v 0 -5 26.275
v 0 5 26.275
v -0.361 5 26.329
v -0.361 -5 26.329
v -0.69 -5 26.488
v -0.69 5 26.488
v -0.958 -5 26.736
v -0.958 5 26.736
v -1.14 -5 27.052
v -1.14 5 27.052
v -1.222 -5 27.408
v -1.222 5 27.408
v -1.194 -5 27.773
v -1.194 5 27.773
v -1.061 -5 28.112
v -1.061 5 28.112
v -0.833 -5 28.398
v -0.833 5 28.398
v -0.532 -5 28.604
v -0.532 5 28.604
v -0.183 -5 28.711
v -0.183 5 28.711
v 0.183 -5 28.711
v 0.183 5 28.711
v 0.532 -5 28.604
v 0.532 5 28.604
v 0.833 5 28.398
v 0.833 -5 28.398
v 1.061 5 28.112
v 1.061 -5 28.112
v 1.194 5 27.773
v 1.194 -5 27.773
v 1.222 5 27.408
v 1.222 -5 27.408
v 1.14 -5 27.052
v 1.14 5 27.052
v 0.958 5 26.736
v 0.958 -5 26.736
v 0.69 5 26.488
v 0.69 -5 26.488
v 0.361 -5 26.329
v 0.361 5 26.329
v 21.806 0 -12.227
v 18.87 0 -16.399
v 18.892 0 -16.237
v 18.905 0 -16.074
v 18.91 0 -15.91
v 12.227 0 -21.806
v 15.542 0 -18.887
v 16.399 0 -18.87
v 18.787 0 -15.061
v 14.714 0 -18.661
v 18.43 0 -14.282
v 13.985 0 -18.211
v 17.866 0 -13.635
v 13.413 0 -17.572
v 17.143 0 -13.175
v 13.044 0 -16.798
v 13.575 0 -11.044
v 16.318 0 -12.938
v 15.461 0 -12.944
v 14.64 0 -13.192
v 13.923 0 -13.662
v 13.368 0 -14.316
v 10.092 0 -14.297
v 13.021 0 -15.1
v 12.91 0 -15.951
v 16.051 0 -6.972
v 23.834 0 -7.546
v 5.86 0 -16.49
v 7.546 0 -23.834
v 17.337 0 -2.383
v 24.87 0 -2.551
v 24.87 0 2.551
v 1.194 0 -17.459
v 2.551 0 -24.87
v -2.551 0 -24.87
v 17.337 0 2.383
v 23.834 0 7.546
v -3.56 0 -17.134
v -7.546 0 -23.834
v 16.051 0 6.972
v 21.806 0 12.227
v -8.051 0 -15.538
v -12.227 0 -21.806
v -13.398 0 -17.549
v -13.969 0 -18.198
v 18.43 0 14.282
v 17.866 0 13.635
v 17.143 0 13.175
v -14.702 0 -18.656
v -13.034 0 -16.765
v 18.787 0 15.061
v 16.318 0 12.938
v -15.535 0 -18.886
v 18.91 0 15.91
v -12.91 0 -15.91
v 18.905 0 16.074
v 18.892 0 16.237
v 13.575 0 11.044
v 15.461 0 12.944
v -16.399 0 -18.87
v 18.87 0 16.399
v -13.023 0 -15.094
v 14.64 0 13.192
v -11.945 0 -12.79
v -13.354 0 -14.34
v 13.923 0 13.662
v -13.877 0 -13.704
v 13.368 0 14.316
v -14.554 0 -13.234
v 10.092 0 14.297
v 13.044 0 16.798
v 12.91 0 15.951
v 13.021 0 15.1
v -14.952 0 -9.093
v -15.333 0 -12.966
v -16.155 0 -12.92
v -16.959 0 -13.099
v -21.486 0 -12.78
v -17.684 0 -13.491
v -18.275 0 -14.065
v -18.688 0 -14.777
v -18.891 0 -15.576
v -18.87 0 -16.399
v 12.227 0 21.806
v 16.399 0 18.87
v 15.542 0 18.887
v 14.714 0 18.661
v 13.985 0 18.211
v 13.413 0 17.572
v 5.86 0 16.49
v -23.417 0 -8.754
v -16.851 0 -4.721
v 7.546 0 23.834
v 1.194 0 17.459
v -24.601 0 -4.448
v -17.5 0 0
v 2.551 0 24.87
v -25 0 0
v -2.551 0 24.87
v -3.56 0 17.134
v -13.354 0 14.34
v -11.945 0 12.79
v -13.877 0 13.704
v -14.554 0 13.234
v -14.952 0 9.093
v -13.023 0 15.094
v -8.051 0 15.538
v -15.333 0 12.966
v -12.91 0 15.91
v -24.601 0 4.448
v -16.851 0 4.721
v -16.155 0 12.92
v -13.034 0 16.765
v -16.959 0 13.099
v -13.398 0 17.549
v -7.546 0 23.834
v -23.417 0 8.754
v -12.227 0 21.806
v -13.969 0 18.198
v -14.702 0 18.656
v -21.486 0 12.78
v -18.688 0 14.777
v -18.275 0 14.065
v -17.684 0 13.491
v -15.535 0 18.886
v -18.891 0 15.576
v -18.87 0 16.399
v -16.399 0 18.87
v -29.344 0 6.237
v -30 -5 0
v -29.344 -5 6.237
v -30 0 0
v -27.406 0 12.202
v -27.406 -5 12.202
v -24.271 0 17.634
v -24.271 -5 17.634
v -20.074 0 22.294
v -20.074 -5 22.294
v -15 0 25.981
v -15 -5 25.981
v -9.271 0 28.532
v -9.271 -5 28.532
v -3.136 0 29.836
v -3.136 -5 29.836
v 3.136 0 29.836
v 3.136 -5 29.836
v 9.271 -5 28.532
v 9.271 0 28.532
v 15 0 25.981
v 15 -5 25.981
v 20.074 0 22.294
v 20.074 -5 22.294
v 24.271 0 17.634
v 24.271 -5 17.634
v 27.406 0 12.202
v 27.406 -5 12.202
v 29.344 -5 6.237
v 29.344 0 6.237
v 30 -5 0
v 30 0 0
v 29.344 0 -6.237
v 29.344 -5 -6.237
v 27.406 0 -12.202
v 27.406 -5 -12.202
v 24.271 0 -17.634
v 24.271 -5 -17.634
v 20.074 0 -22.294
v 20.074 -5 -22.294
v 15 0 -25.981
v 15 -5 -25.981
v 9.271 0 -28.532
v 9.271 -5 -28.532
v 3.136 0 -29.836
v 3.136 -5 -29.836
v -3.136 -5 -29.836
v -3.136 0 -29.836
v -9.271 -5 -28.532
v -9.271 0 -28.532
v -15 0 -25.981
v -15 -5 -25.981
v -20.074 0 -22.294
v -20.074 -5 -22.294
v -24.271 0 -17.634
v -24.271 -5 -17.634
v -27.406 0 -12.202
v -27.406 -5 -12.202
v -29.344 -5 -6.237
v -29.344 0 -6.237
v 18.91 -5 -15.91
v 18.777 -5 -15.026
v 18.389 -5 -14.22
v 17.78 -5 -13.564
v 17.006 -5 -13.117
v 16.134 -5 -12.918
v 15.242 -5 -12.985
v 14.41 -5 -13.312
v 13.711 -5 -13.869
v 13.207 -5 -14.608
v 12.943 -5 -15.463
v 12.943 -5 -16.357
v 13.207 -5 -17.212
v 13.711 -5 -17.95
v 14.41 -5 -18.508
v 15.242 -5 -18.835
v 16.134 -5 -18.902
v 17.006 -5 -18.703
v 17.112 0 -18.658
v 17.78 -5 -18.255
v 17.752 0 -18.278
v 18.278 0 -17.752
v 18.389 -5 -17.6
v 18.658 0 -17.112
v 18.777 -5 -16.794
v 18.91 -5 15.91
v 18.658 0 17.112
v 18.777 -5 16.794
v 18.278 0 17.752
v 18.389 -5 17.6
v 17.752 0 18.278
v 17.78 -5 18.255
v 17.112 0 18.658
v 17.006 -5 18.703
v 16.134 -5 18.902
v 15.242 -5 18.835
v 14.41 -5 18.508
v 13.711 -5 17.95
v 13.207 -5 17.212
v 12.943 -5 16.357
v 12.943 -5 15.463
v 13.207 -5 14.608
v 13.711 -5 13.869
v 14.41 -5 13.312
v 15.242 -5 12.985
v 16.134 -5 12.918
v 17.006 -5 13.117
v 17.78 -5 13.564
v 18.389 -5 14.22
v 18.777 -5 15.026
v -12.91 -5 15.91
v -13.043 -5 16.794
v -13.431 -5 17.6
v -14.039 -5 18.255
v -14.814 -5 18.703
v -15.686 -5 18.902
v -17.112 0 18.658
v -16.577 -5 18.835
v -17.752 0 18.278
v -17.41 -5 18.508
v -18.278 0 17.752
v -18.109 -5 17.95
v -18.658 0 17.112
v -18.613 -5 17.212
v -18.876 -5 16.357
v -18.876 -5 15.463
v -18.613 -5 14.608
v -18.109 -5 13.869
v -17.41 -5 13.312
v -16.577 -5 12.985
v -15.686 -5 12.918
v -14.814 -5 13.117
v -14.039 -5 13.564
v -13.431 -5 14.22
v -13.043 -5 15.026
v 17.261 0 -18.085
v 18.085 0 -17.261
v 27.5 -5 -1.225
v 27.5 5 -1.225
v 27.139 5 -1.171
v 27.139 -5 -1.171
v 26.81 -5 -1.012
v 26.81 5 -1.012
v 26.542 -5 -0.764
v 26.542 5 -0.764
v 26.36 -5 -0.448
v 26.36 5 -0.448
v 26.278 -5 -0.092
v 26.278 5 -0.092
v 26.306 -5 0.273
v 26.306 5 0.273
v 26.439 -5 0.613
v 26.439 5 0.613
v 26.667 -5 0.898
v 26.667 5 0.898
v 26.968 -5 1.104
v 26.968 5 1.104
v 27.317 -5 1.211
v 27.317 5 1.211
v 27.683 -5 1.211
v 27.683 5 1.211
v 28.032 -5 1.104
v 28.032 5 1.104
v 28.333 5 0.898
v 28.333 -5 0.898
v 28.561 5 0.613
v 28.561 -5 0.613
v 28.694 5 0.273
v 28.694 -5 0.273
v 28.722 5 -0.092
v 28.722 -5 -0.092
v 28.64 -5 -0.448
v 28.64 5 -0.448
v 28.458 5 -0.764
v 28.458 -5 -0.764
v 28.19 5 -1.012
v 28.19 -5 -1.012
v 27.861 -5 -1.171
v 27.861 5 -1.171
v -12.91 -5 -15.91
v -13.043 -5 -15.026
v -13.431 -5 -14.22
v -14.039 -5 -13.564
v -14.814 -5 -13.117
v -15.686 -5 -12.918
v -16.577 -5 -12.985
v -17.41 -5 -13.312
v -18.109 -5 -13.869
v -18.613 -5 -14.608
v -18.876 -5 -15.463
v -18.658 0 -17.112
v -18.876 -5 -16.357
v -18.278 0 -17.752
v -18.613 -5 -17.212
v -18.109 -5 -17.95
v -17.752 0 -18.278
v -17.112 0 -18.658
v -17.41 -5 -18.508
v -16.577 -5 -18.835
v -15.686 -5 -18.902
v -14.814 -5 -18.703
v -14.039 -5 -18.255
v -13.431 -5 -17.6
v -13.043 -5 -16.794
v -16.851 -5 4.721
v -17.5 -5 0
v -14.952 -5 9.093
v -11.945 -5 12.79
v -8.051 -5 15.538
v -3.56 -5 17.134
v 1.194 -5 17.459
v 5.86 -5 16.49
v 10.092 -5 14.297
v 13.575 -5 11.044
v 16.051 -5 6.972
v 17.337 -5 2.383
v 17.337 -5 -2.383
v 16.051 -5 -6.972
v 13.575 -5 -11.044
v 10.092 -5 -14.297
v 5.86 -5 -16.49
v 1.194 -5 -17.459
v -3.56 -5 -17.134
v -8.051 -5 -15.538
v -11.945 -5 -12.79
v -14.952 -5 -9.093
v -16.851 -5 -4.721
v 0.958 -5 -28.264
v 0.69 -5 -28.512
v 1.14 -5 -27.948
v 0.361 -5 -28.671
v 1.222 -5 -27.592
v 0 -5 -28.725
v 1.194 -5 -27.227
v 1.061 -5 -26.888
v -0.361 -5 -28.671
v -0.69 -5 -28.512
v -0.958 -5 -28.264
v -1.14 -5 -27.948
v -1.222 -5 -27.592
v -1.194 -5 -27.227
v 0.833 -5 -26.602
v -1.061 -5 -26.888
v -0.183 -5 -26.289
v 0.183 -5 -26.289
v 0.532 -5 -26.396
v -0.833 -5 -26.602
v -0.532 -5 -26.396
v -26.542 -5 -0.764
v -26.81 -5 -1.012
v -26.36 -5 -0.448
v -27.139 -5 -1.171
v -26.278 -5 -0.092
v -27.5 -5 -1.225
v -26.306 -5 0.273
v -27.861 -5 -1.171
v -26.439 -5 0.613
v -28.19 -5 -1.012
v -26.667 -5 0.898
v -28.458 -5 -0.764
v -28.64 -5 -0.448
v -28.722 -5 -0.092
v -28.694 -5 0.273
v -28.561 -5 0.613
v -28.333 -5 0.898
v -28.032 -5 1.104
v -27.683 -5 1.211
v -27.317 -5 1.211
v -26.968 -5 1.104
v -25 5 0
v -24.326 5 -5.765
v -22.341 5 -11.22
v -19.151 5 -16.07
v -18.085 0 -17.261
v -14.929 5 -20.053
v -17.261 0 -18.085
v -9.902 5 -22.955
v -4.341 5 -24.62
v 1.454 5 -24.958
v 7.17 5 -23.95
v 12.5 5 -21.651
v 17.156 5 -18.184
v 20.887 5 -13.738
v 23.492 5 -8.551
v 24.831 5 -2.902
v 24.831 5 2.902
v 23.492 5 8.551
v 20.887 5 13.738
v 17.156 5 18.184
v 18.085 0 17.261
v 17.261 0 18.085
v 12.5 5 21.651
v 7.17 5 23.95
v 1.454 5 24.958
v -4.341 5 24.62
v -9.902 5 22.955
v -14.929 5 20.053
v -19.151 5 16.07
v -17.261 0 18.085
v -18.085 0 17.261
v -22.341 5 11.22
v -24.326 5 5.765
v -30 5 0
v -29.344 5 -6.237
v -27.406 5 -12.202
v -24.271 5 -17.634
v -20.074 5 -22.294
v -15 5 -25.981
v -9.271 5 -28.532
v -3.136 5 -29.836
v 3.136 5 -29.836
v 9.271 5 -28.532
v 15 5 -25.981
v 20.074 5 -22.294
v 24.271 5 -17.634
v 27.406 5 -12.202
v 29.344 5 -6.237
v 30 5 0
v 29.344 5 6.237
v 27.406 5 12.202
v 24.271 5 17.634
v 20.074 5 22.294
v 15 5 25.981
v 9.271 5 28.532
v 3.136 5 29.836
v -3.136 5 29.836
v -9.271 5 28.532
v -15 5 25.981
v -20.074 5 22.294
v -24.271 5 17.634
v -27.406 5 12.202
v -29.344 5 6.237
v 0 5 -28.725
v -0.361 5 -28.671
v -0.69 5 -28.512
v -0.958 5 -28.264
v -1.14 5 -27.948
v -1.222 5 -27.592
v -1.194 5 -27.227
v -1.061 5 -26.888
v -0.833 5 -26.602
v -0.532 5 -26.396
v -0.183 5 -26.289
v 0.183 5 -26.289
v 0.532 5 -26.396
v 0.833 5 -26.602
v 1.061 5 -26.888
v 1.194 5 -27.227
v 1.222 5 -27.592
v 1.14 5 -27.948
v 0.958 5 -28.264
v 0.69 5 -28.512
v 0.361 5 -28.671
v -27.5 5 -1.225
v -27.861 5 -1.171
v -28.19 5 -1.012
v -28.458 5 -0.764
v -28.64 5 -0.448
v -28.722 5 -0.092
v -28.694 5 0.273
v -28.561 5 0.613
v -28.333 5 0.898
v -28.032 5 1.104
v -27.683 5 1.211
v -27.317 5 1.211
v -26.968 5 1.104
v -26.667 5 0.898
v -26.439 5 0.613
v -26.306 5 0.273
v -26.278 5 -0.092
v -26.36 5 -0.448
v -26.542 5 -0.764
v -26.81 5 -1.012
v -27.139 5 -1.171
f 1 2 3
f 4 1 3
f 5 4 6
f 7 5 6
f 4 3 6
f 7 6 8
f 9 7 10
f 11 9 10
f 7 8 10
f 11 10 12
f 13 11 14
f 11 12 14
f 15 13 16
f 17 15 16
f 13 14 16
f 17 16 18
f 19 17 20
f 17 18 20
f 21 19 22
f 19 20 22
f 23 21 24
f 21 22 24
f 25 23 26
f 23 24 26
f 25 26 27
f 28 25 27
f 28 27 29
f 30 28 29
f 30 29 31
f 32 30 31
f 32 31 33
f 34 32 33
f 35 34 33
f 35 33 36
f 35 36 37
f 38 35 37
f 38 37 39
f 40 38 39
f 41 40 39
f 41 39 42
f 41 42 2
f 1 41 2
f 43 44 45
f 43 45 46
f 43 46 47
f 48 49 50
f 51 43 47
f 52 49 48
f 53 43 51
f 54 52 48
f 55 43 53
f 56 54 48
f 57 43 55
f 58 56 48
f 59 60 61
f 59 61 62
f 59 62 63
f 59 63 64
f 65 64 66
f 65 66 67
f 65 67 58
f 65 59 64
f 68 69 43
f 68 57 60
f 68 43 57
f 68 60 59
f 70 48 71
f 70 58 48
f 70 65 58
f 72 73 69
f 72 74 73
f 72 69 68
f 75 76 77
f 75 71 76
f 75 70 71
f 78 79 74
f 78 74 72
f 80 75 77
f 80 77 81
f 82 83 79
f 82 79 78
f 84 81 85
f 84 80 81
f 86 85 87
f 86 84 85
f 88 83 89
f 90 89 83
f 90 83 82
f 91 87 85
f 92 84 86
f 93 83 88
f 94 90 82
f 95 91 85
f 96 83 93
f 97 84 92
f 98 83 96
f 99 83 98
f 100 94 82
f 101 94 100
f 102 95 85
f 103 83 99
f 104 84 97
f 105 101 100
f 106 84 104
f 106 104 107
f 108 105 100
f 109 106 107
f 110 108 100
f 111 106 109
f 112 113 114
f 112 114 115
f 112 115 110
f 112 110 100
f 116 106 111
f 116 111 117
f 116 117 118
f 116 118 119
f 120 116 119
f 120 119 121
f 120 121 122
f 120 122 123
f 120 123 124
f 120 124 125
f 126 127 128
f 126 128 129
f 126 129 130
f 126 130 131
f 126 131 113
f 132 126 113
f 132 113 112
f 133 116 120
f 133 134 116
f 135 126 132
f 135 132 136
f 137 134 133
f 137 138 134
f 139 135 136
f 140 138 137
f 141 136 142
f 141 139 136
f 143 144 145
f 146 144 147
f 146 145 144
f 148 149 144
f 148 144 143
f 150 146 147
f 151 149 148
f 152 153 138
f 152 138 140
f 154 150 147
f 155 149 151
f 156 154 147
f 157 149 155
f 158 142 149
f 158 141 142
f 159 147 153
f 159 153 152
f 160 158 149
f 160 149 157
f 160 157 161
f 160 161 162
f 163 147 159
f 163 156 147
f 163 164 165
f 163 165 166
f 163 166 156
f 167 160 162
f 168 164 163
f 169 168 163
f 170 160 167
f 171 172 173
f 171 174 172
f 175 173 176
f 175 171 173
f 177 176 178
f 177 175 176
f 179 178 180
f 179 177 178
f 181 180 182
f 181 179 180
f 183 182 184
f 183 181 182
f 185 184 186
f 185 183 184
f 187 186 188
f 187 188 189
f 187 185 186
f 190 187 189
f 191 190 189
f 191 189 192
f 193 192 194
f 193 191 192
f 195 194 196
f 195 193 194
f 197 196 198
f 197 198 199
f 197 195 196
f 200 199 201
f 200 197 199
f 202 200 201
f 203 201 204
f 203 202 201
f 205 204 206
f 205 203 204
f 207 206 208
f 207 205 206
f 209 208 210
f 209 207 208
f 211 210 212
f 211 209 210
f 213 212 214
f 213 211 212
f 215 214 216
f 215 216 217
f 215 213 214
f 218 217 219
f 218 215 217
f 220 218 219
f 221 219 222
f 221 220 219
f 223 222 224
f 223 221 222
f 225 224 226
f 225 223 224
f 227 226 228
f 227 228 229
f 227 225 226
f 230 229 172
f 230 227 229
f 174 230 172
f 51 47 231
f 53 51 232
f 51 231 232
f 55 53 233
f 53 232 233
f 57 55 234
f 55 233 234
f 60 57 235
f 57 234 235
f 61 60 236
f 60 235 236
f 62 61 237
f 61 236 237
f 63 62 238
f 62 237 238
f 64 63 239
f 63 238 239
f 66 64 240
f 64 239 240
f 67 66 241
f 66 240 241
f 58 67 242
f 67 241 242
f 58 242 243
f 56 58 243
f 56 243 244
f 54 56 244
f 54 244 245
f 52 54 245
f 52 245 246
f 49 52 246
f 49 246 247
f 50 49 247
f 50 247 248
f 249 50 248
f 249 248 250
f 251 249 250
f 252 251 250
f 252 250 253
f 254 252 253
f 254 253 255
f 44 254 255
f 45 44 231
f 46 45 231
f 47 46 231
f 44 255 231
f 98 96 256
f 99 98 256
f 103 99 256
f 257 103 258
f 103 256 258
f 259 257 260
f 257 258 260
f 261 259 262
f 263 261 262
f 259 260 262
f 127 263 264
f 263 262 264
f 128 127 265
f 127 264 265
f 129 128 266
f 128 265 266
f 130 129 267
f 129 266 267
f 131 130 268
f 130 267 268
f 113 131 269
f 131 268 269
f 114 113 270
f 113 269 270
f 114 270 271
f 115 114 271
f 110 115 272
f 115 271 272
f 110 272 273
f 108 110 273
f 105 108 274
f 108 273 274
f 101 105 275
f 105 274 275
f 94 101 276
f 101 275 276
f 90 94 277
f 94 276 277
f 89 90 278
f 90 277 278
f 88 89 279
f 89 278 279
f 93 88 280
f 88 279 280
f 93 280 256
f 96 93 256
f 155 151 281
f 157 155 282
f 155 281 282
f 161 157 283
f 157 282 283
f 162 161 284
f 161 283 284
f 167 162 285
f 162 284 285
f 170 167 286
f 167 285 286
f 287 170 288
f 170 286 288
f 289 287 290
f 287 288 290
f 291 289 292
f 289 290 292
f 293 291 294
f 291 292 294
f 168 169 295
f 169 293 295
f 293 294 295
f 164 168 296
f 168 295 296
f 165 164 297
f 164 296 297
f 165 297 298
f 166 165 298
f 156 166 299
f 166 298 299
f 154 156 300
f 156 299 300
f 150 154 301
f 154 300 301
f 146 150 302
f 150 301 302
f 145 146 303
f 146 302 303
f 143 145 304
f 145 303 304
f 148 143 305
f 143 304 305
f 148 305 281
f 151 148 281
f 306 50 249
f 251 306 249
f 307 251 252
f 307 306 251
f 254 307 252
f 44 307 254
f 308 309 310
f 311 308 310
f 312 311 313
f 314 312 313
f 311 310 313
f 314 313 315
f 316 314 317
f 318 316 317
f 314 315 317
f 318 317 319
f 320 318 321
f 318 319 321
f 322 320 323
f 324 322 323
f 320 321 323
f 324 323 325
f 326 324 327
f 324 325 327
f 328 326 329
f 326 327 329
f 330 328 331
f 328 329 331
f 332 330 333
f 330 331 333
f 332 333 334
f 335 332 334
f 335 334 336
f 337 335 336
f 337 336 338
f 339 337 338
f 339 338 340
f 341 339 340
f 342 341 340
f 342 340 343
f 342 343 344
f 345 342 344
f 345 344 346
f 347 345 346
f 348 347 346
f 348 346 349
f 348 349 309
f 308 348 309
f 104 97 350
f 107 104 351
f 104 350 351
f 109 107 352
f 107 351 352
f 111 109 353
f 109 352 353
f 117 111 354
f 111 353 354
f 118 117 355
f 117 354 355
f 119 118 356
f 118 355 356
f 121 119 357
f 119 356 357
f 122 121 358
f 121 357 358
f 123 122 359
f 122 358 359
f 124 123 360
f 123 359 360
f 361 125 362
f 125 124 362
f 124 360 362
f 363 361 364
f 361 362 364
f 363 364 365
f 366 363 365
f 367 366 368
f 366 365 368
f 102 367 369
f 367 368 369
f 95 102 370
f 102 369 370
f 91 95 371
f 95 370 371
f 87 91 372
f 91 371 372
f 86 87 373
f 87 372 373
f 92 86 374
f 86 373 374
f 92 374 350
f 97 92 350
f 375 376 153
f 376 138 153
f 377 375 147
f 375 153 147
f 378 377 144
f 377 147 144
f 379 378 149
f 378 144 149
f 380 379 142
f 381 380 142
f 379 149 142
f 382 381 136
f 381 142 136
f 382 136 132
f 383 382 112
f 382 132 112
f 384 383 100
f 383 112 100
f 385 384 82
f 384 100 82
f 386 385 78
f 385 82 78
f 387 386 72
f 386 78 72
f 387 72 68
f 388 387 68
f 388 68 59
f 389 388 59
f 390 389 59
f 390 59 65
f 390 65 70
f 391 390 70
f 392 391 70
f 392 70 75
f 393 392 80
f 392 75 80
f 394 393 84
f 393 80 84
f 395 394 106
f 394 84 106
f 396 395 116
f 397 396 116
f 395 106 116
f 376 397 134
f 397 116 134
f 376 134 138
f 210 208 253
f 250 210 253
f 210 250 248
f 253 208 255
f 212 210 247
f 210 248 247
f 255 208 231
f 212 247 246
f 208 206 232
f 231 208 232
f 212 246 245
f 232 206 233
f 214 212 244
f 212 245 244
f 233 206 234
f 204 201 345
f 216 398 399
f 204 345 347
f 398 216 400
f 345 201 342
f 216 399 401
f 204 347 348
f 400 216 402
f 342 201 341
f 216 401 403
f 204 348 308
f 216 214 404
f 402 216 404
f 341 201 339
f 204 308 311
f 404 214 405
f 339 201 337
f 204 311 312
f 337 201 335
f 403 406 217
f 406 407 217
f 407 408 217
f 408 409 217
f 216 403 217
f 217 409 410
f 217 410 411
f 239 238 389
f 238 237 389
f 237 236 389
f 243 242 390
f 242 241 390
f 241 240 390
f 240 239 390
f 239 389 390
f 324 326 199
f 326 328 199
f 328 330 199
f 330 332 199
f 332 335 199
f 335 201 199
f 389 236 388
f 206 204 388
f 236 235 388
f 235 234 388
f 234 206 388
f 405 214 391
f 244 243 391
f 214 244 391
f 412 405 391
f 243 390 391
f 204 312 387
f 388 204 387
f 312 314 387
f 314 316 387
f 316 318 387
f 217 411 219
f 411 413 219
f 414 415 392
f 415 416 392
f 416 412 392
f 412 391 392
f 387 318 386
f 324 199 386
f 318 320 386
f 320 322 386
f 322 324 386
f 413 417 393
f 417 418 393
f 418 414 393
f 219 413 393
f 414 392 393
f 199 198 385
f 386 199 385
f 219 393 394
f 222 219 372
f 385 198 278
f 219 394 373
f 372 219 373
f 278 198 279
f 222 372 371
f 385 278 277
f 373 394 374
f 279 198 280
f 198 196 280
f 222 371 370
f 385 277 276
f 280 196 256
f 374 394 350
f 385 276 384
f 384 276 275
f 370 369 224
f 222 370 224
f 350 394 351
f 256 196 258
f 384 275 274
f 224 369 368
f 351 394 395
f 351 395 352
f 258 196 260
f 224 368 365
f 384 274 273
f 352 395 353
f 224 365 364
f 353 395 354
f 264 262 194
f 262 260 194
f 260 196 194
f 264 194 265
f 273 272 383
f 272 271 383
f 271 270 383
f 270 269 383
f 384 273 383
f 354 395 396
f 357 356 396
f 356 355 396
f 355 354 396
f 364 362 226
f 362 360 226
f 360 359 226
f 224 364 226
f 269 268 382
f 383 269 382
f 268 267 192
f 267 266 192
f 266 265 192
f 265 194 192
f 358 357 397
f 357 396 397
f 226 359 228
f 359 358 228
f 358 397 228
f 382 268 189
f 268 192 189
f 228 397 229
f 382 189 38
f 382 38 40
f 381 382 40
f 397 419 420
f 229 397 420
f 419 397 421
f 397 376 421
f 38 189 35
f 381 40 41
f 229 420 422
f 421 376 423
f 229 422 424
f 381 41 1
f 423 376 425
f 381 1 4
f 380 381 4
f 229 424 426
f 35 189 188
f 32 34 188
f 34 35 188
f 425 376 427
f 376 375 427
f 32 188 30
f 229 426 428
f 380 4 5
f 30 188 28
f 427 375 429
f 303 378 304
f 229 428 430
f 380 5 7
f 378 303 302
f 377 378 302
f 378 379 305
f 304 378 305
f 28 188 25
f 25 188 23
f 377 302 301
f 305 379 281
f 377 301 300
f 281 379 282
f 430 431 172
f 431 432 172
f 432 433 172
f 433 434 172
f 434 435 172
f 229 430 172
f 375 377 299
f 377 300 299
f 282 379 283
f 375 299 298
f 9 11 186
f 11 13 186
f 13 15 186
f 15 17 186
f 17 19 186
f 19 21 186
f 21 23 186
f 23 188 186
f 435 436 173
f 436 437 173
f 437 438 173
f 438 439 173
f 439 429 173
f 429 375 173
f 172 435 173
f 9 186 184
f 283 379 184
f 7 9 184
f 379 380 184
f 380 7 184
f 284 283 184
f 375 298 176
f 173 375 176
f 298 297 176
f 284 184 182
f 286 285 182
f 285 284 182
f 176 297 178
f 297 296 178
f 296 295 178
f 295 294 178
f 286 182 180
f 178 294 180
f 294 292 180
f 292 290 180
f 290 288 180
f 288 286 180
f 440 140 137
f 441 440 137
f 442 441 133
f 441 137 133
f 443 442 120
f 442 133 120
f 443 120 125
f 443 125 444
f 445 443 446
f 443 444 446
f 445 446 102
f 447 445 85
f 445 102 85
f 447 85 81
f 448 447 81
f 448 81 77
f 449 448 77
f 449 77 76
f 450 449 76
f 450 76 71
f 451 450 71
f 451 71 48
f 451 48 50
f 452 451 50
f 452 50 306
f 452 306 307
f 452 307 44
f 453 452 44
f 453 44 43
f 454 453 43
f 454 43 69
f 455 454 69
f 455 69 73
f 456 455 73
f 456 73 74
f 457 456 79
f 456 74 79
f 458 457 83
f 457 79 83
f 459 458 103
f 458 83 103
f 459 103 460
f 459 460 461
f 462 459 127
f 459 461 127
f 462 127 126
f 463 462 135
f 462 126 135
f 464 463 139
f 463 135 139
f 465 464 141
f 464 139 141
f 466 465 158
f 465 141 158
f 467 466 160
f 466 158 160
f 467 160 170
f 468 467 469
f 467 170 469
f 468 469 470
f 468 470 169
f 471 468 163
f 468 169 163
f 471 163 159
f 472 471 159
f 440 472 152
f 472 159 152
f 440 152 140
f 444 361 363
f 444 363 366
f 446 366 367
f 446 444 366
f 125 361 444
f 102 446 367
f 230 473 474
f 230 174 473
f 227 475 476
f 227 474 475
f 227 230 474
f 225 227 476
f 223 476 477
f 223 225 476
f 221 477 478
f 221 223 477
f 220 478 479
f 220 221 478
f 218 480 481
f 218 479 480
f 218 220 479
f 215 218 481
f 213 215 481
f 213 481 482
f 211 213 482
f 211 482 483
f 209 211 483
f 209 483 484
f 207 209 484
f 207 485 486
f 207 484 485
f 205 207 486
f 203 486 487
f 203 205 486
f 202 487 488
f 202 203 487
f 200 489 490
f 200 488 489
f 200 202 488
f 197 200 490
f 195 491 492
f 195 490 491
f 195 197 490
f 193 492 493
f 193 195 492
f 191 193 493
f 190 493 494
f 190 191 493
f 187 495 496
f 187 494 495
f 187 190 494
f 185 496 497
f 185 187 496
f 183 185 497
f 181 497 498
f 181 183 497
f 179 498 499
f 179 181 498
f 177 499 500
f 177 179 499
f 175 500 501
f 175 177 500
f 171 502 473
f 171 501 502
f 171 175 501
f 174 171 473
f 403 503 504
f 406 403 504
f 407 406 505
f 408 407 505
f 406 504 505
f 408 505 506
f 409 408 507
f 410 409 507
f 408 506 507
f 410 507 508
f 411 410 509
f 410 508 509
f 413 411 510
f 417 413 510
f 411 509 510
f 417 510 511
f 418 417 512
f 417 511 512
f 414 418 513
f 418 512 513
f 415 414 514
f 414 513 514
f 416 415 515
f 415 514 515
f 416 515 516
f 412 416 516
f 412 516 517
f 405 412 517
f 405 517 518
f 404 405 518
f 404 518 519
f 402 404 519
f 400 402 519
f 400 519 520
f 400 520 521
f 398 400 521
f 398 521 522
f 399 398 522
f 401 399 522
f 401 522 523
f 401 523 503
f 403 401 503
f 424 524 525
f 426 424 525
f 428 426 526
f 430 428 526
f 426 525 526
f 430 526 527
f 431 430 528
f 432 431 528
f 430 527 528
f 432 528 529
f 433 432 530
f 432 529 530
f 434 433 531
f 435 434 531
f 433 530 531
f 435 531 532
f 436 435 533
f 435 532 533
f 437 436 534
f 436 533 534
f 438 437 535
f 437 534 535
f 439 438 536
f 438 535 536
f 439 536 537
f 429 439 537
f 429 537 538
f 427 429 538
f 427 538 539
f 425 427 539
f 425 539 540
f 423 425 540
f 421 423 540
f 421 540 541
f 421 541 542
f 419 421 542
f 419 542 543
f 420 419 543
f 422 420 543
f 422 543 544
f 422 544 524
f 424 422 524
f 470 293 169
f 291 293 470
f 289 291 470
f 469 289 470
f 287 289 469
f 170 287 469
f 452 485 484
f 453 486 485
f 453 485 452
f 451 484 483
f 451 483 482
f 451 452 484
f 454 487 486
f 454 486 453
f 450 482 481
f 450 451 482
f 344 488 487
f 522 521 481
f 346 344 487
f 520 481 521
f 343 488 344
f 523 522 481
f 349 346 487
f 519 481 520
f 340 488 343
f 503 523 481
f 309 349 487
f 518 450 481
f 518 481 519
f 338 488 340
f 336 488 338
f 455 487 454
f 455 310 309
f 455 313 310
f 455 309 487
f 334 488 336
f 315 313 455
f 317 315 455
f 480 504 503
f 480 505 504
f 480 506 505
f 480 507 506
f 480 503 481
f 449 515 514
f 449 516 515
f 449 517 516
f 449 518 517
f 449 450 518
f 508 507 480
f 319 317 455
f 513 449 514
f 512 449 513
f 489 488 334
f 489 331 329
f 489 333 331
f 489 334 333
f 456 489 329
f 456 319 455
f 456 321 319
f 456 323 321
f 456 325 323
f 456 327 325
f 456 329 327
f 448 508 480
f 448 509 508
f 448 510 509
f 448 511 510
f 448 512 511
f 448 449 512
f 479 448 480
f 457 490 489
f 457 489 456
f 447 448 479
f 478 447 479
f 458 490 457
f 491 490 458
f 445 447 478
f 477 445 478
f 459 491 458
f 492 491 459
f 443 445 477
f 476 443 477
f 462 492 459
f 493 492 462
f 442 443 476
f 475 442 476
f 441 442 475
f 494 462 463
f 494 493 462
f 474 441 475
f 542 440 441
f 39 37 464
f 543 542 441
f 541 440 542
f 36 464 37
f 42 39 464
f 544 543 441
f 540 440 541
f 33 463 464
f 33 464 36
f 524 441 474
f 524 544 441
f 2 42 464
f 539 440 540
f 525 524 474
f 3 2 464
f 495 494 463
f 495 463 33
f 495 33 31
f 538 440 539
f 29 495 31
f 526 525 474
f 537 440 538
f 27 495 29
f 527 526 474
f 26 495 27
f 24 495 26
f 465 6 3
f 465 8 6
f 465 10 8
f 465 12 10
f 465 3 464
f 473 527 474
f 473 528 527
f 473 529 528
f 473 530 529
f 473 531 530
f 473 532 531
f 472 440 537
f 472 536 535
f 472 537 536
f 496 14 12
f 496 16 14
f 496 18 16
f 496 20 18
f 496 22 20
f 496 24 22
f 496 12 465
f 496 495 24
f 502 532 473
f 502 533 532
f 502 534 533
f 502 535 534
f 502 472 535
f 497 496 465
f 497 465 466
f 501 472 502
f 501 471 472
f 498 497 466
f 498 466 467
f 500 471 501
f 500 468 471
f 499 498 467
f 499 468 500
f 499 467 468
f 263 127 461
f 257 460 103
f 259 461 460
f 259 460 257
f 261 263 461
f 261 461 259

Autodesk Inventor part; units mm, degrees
ref_plane "YZ Plane" through (0, 0, 0) normal (1, 0, 0) x (0, 1, 0)
ref_plane "XZ Plane" through (0, 0, 0) normal (0, 1, 0) x (-1, 0, 0)
ref_plane "XY Plane" through (0, 0, 0) normal (0, 0, 1) x (1, 0, 0)
sketch "Sketch1" plane through (0, 0, 0) normal (0, 1, 0) x (-1, 0, 0)
  circle A0 centre (0, 0) radius 25
  circle A1 centre (0, 0) radius 30
  circle A2 centre (0, 0) radius 17.5
  line L0 (0, 0) -> (25, 0) construction
  circle A3 centre (17.6777, -17.6777) radius 2
  circle A4 centre (17.6777, 17.6777) radius 2
  circle A5 centre (-17.6777, 17.6777) radius 2
  circle A6 centre (-17.6777, -17.6777) radius 2
  point P0 (0, -27.5)
  point P1 (0, -27.5)
  point P2 (27.5, 0)
  point P3 (-27.5, 0)
  point P4 (0, 27.5)
  dimension "d0" = 50
  dimension "d1" = 60
  dimension "d17" = 27.5
  dimension "d18" = 27.5
  dimension "d19" = 27.5
  dimension "d20" = 27.5
  dimension "d28" = 35
  dimension "d30" = 4
  dimension "d33" = 360
extrude "Extrusion1" add sketch "Sketch1" along normal blind 5 contours A0 A4 | A3 A0 | A0 A5 | A6 A0 | A1 picked at (18.1752, 18.1125) picked at (18.1752, -18.1125) picked at (-18.083, 18.1995) picked at (-18.083, -18.1995)
extrude "Extrusion2" add sketch "Sketch1" against normal blind 5 contours A0 A3 A6 A5 A4 | A4 A0 | A0 A4 | A3 A0 | A0 A3 | A5 A0 | A0 A5 | A6 A0 | A0 A6 | A1
hole "Hole2" at (0, 0, -27.5) at (-27.5, 0, 0) at (27.5, 0, 0) at (0, 0, 27.5) direction (0, 1, 0) diameter 2.45 end through all both
sketch "Sketch2" plane through (0, -5, 0) normal (0, -1, 0) x (1, 0, 0)
  circle A0 centre (0, 0) radius 22.5
  line L0 (0, 0) -> (15.9099, 15.9099)
  line L1 (0, 0) -> (22.5, 0) construction
  circle A1 centre (15.9099, 15.9099) radius 3
  circle A2 centre (-15.9099, 15.9099) radius 3
  circle A3 centre (-15.9099, -15.9099) radius 3
  circle A4 centre (15.9099, -15.9099) radius 3
  dimension "d35" = 45
  dimension "d36" = 45
  dimension "d37" = 6
  dimension "d40" = 360
extrude "Extrusion3" cut sketch "Sketch2" against normal blind 5 contours A1 L0 A0 | A0 A1 | A4 A0 | A0 A4 | L0 A1 A0 | A3 A0 | A0 A3 | A2 A0 | A0 A2
thread "Thread1" size "M6x1" class "6H" standard "ISO Metric profile" full length
thread "Thread2" size "M6x1" class "6H" standard "ISO Metric profile" full length
thread "Thread3" size "M6x1" class "6H" standard "ISO Metric profile" full length
thread "Thread4" size "M6x1" class "6H" standard "ISO Metric profile" full length
properties part number "Placeholderjointouterring"
